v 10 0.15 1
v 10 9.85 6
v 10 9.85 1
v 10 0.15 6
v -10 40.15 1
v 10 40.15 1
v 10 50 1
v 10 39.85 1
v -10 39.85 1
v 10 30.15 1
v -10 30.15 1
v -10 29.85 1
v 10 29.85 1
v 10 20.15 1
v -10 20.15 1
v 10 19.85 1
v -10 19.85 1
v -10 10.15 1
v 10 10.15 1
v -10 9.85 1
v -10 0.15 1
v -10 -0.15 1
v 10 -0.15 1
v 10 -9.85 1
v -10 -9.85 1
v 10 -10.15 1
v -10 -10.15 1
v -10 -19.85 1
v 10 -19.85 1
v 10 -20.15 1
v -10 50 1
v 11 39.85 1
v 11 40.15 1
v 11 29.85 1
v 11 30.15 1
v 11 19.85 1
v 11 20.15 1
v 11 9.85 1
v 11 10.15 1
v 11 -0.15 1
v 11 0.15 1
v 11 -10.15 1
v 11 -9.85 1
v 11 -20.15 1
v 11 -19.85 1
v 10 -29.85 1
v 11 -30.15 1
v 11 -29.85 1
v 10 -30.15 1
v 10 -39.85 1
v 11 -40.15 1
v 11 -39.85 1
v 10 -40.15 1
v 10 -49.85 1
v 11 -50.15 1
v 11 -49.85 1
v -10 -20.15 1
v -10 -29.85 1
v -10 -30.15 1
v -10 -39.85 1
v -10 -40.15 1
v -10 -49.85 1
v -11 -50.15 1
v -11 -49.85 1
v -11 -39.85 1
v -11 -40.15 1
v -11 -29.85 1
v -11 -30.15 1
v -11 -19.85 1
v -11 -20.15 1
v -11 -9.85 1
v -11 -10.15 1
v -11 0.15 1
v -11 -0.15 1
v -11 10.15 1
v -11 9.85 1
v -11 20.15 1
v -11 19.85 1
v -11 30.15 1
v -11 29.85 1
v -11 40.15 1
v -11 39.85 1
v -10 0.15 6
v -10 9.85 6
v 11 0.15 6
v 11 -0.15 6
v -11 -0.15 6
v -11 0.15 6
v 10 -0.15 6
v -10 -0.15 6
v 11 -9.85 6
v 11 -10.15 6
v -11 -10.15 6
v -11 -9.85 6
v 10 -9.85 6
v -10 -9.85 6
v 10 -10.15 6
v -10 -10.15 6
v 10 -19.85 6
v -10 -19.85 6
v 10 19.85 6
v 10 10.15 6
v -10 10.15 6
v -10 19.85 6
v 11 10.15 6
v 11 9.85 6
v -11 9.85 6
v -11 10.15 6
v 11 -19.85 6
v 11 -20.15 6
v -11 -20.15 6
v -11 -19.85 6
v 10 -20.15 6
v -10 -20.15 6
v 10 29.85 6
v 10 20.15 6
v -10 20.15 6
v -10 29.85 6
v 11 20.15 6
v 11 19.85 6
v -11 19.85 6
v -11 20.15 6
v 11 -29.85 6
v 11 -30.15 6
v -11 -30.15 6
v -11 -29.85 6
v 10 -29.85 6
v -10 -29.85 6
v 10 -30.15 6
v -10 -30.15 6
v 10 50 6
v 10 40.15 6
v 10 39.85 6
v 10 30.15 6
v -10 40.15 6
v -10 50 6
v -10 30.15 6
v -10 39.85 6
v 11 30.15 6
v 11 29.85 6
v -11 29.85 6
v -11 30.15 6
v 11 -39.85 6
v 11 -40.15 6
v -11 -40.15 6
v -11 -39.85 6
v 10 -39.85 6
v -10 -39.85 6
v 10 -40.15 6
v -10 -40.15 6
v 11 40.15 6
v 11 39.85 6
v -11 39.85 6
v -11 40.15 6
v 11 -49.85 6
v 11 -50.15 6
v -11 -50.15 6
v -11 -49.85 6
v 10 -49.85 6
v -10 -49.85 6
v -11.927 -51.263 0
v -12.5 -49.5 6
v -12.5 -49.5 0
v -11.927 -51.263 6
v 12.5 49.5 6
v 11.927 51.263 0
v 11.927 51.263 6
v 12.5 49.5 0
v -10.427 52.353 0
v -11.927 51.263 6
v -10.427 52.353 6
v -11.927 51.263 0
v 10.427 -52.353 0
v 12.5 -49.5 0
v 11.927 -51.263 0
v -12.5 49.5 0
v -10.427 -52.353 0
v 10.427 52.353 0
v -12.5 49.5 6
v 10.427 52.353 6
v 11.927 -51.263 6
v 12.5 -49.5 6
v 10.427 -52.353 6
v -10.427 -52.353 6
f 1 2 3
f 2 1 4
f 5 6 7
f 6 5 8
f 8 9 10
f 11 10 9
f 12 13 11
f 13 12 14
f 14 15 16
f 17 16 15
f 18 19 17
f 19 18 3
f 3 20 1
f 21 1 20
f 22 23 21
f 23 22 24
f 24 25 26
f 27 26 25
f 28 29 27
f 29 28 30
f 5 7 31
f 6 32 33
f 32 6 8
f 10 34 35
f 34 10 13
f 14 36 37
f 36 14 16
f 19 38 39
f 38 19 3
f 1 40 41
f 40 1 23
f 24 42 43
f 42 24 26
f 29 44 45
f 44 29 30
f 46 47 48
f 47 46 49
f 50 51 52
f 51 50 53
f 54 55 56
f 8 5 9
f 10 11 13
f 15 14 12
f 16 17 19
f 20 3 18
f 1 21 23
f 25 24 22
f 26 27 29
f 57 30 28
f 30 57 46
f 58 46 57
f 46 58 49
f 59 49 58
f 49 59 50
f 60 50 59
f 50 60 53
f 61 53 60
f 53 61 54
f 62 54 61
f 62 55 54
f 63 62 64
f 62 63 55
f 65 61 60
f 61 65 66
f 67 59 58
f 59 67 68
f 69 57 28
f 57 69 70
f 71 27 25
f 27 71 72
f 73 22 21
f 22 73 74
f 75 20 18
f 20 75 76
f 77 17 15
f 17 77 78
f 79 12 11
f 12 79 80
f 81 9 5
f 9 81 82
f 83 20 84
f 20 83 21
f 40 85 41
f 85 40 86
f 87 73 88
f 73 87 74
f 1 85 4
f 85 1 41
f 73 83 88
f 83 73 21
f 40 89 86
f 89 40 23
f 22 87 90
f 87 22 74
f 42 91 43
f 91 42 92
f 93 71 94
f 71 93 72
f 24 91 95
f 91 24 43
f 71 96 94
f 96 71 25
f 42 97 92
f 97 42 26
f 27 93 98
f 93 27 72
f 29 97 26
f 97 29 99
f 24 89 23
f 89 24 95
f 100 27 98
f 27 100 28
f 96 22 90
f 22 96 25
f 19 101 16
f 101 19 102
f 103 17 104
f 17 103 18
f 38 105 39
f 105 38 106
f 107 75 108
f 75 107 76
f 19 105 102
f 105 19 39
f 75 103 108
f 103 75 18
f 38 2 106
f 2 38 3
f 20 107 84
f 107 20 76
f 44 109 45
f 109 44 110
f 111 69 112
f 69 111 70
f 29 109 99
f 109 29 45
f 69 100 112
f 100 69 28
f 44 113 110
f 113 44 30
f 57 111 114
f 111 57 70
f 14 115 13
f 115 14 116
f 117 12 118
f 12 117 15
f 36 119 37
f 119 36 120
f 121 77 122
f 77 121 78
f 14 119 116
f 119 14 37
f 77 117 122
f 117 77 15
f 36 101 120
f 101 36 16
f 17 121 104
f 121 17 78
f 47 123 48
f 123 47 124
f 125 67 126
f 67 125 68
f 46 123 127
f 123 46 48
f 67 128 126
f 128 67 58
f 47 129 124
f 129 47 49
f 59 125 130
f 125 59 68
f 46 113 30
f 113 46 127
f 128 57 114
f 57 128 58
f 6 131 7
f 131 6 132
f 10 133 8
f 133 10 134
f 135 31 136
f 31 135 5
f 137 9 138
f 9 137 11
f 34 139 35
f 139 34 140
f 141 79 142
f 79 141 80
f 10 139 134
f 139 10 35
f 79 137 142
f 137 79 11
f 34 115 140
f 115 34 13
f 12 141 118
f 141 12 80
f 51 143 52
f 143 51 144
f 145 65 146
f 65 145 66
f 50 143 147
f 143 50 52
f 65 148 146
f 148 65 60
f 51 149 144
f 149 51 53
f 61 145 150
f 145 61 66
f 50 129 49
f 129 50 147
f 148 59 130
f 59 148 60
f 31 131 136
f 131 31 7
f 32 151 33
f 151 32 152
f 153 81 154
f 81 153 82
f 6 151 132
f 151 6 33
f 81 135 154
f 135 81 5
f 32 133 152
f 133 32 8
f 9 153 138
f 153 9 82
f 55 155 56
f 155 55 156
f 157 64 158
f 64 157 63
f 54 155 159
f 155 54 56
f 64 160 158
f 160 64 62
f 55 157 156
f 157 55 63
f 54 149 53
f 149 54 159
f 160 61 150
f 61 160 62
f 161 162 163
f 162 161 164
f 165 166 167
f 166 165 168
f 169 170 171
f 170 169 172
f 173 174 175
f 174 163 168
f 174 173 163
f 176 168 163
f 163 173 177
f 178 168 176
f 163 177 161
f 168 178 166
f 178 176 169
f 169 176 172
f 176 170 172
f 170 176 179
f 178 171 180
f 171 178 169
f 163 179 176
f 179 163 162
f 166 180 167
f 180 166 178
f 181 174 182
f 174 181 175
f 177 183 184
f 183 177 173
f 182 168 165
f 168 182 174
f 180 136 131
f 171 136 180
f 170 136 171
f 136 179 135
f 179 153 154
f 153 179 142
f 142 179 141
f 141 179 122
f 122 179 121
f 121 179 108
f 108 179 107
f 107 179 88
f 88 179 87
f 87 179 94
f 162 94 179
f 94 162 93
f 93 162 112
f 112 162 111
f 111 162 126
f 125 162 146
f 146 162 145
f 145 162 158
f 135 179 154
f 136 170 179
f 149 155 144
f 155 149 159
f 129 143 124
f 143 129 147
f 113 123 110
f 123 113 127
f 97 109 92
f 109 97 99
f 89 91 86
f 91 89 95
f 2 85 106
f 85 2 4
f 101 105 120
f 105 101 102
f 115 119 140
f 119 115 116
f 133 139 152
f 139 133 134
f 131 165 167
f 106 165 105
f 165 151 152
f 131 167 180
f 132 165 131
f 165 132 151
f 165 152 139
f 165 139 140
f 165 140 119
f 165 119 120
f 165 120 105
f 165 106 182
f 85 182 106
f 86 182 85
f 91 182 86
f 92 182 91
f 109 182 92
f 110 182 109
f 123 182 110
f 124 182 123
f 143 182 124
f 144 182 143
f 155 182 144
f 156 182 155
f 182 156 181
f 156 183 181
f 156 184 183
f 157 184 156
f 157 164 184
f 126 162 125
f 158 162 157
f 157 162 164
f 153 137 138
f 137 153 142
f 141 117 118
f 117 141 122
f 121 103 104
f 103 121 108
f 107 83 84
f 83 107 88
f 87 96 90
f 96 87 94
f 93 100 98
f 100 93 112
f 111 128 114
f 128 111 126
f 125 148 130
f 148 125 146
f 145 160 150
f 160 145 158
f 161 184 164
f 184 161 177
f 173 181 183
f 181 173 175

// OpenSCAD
// file: config.scad
//$fs=$fs/2;
//$fa=$fa/2;

r4 = 2.2;
r8 = 4.2;
r10 = 5.2;

layer_height = 0.25;

switch_d = 9.6;

nema17_r_vis = 15.5;
nema17_r_centre = 11.5;
nema17_h_centre = 2;
nema17_h = 43;
nema17_l = 40;

boite_ui_largeur = 28.5;
boite_ui_l = 46;

support_laser = 24;

r3 = 1.75;
r3_2d = 1.5;
r3_vis = 1.65;
r3_head = 3.6;
m3_r = r3;
m3_nut_d = 7;
m3_nut_d2 = 6.2;
m3_nut_h = 3;

m4_r = 2.3;
m4_nut_d = 8.4;
m4_nut_d2 = 7.5;
m4_nut_h = 3.5;

608_r = 23/2;
608_h = 8;

laser_printer_l = 609;
laser_printer_lg = 456;


module support_nut(d=3, l_screw1 = 20, l_screw2 = 20, l_nut = 20, h_screw2 = 0.2){
    if(d==3){
        screw_r = r3;
        nut_r = m3_nut_d/2;
        nut_h = m3_nut_h;
        cylinder(nut_h, r = nut_r, $fn = 6, center = true);
        translate([0, 0, -l_screw1])cylinder(l_screw1 +1, r = screw_r, $fn = 8);
        translate([0, 0, m3_nut_h/2+ h_screw2])cylinder(l_screw2, r = screw_r, $fn = 8);
        l = m3_nut_d*cos(30);
        translate([0, -l/2, -nut_h/2]) cube([l_nut, l,nut_h]);
    } else if(d==4){
        screw_r = r4;
        nut_r = m4_nut_d/2;
        nut_h = m4_nut_h;
        cylinder(nut_h, r = nut_r, $fn = 6, center = true);
        translate([0, 0, -l_screw1])cylinder(l_screw1 +1, r = screw_r, $fn = 8);
        translate([0, 0, m4_nut_h/2+ h_screw2])cylinder(l_screw2, r = screw_r, $fn = 8);
        l = m4_nut_d*cos(30);
        translate([0, -l/2, -nut_h/2]) cube([l_nut, l,nut_h]);
    }
}


module nut(d=3, center = false){
    nut_r = m3_nut_d/2;
    nut_h = m3_nut_h;
    if(d==3){
        nut_r = m3_nut_d/2;
        nut_h = m3_nut_h;
    } 
    cylinder(nut_h, r = nut_r, $fn = 6, center = center);
}



module m3(h, nut = false, head = false){
    cylinder(h, m3_r, m3_r, $fn=16);
    if(nut){
        cylinder(m3_nut_h, r = m3_nut_d/2, $fn = 6);
    }
}

module m3_nut(h){
    cylinder(m3_nut_h, r = m3_nut_d/2, $fn = 6);
    translate([0, -m3_nut_d2/2, 0]) cube([h, m3_nut_d2, m3_nut_h]);
}

module m4(h, nut = false, head = false){
    cylinder(h, m4_r, m4_r);
    if(nut){
        cylinder(m4_nut_h, r = m4_nut_d/2, $fn = 6);
    }
}

module m5(h, nut = false, head = false){
    cylinder(h, r = 2.7);
}

m8_nut_d = 15;
m8_nut_d2 = 13;
m8_nut_h = 6.5;
module m8(h, nut = false, head = false){
    cylinder(h, r = r8);
    if(nut){
        cylinder(m8_nut_h, r = m8_nut_d/2, $fn = 6);
    }
}

module cube_arrondi(x, y, z, r=2){
    hull(){
        translate([(x/2-r), (y/2-r), 0]) cylinder(z,r=r);
        translate([(x/2-r), -(y/2-r), 0]) cylinder(z,r=r);
        translate([-(x/2-r), (y/2-r), 0]) cylinder(z,r=r);
        translate([-(x/2-r), -(y/2-r), 0]) cylinder(z,r=r);
    }
}

module demi_glissiere(r, l, h){
    cylinder(h, r, r);
    translate([-r, 0, 0]) cube([r*2, l, h]);
}


module nema17_2d(){
    nema17_l = 43;
    nema17_h = 6;
    polygon([[0,nema17_h], [nema17_h,0]
            , [nema17_l-nema17_h,0],[nema17_l,nema17_h]
            , [nema17_l,nema17_l-nema17_h],[nema17_l-nema17_h,nema17_l]
            , [8,nema17_l],[0,nema17_l-nema17_h] ]);
}

module nema17_2d2(){
    translate([nema17_r_vis, nema17_r_vis] ) circle(r3_2d);
    translate([nema17_r_vis, -nema17_r_vis] ) circle(r3_2d);
    translate([-nema17_r_vis, nema17_r_vis] ) circle(r3_2d);
    translate([-nema17_r_vis, -nema17_r_vis] ) circle(r3_2d);
    circle(nema17_r_centre);
}


module nema17(){
    translate([-nema17_h/2, -nema17_h/2, -nema17_l/2] ) linear_extrude(nema17_l) nema17_2d();
    
    h = nema17_h/2+6;
    translate([nema17_r_vis, nema17_r_vis, 0] )rotate([0, 0, 0]) cylinder(h, r = r3);
    translate([nema17_r_vis, -nema17_r_vis, 0] )rotate([0, 0, 0]) cylinder(h, r = r3);
    translate([-nema17_r_vis, nema17_r_vis, 0] )rotate([0, 0, 0]) cylinder(h, r = r3);
    translate([-nema17_r_vis, -nema17_r_vis, 0] )rotate([0, 0, 0]) cylinder(h, r = r3);
    cylinder(h, nema17_r_centre, nema17_r_centre);
    cylinder(h+14, r = 8);
    
    translate([-8.5, 0, -nema17_l/2] ) cube([17,30, 10]);
}

module corner(l_corner, h_corner, lg_corner){
    translate([0, lg_corner, 0]) rotate([90, 0, 0]) linear_extrude(lg_corner) polygon([[0,0], [l_corner, 0], [0, h_corner]]);
}


/**
 * 2D
 **/

module m3_2d(){
    circle(r3_2d);
}


module cran_x(_l, e, cran, inv){
    difference(){
        square([_l, e]);
        if(inv){
            for(i=[-round(_l/cran):round(_l/cran)]){
                translate([_l/2 + cran/2 - 2*i*cran, -1]) square([cran, e+2]);
            }
        }else{
            for(i=[-round(_l/cran):round(_l/cran)]){
                translate([_l/2 - cran/2 - 2*i*cran, -1]) square([cran, e+2]);
            }
        }
    }
}

module cran_y(_l, e, cran, inv){
    translate([e, 0]) rotate([0, 0, 90]) cran_x(_l, e, cran, inv); 
}

module whole_2d(type_vis){
    if(type_vis == 3){
        circle(1.5);
    } else if(type_vis == 4){
        circle(2);
    } else {
        echo("whole_2d " + type_vis);
    }
}

module nuts_2d(type_vis){
    if(type_vis == 3){
        translate([-1.5, 0])square([3, 20]);
        translate([-5.5/2, 10])square([5.5, 2.5]);
    } else if(type_vis == 4){
        translate([-2, 0])square([4, 30]);
        translate([-7/2, 20])square([7, 3.5]);
    } else {
        echo("nuts_2d " + type_vis);
    }
}

module cran_x_vis(_l, e, cran, type_vis = 3, trous = [0.1, 0.5, 0.9]){
    difference(){
        square([_l, e]);
        for(i=[-round(_l/cran):round(_l/cran)]){
                translate([_l/2 - cran/2 - 2*i*cran, -1]) square([cran, e+2]);
            }
        
    }
    for(i = trous){
        j = round((i-0.5)*_l/(2*cran));
        translate([_l/2  - 2*j*cran, e/2]) whole_2d(type_vis);
    }
}

module cran_x_nuts(_l, e, cran, type_vis = 3, trous = [0.1, 0.5, 0.9]){
    difference(){
        square([_l, e]);
        for(i=[-round(_l/cran):round(_l/cran)]){
                translate([_l/2 + cran/2 - 2*i*cran, -1]) square([cran, e+2]);
        }
    }
    for(i = trous){
        j = round((i-0.5)*_l/(2*cran));
        translate([_l/2  - 2*j*cran, e/2]) nuts_2d(type_vis);
    }
}

module cran_y_vis(_l, e, cran, type_vis = 3, trous = [0.1, 0.5, 0.9]){
    translate([e, 0]) rotate([0, 0, 90]) cran_x_vis(_l, e, cran, type_vis, trous);
}

module cran_y_nuts(_l, e, cran, type_vis = 3, trous = [0.1, 0.5, 0.9]){
    translate([0, _l]) rotate([0, 0, -90]) cran_x_nuts(_l, e, cran, type_vis, trous);
}
// main file
include <config.scad>

lg=20;
l = 80;
h=10;

de = 10;
e = 2;

module ble(){
    difference(){ 
        translate([-0, l/2-e]) cube_arrondi(lg, l, h, 3);
        translate([0,l/2,h]) rotate([0,45,0]) cube([h, l, h], center =true);
        for(i=[0:10]){
            translate([0,i*10,h]) rotate([0,45,0]) cube([h+1, 0.5, h+1], center =true);
        }
    }
}

lde = 0.3;
h2=6;
h21=4;
h22=1;
module ble2(){
    difference(){ 
        cube_arrondi(25,105,h2, 3);
        //translate([-10, -l/2, h21]) cube([20,l,5]);;
        
        for(i=[0:4]){
            translate([-10,i*10,h22]) cube([20,10,h2]);
            translate([-11,(i)*10-lde/2,h22]) cube([22,lde,h2]);
            translate([-11,(-1-i)*10-lde/2,h22]) cube([22,lde,h2]);
            
            translate([-10,(-1-i)*10,h22]) cube([20,10,h2]);
            
        }
    }
}

ble2();
